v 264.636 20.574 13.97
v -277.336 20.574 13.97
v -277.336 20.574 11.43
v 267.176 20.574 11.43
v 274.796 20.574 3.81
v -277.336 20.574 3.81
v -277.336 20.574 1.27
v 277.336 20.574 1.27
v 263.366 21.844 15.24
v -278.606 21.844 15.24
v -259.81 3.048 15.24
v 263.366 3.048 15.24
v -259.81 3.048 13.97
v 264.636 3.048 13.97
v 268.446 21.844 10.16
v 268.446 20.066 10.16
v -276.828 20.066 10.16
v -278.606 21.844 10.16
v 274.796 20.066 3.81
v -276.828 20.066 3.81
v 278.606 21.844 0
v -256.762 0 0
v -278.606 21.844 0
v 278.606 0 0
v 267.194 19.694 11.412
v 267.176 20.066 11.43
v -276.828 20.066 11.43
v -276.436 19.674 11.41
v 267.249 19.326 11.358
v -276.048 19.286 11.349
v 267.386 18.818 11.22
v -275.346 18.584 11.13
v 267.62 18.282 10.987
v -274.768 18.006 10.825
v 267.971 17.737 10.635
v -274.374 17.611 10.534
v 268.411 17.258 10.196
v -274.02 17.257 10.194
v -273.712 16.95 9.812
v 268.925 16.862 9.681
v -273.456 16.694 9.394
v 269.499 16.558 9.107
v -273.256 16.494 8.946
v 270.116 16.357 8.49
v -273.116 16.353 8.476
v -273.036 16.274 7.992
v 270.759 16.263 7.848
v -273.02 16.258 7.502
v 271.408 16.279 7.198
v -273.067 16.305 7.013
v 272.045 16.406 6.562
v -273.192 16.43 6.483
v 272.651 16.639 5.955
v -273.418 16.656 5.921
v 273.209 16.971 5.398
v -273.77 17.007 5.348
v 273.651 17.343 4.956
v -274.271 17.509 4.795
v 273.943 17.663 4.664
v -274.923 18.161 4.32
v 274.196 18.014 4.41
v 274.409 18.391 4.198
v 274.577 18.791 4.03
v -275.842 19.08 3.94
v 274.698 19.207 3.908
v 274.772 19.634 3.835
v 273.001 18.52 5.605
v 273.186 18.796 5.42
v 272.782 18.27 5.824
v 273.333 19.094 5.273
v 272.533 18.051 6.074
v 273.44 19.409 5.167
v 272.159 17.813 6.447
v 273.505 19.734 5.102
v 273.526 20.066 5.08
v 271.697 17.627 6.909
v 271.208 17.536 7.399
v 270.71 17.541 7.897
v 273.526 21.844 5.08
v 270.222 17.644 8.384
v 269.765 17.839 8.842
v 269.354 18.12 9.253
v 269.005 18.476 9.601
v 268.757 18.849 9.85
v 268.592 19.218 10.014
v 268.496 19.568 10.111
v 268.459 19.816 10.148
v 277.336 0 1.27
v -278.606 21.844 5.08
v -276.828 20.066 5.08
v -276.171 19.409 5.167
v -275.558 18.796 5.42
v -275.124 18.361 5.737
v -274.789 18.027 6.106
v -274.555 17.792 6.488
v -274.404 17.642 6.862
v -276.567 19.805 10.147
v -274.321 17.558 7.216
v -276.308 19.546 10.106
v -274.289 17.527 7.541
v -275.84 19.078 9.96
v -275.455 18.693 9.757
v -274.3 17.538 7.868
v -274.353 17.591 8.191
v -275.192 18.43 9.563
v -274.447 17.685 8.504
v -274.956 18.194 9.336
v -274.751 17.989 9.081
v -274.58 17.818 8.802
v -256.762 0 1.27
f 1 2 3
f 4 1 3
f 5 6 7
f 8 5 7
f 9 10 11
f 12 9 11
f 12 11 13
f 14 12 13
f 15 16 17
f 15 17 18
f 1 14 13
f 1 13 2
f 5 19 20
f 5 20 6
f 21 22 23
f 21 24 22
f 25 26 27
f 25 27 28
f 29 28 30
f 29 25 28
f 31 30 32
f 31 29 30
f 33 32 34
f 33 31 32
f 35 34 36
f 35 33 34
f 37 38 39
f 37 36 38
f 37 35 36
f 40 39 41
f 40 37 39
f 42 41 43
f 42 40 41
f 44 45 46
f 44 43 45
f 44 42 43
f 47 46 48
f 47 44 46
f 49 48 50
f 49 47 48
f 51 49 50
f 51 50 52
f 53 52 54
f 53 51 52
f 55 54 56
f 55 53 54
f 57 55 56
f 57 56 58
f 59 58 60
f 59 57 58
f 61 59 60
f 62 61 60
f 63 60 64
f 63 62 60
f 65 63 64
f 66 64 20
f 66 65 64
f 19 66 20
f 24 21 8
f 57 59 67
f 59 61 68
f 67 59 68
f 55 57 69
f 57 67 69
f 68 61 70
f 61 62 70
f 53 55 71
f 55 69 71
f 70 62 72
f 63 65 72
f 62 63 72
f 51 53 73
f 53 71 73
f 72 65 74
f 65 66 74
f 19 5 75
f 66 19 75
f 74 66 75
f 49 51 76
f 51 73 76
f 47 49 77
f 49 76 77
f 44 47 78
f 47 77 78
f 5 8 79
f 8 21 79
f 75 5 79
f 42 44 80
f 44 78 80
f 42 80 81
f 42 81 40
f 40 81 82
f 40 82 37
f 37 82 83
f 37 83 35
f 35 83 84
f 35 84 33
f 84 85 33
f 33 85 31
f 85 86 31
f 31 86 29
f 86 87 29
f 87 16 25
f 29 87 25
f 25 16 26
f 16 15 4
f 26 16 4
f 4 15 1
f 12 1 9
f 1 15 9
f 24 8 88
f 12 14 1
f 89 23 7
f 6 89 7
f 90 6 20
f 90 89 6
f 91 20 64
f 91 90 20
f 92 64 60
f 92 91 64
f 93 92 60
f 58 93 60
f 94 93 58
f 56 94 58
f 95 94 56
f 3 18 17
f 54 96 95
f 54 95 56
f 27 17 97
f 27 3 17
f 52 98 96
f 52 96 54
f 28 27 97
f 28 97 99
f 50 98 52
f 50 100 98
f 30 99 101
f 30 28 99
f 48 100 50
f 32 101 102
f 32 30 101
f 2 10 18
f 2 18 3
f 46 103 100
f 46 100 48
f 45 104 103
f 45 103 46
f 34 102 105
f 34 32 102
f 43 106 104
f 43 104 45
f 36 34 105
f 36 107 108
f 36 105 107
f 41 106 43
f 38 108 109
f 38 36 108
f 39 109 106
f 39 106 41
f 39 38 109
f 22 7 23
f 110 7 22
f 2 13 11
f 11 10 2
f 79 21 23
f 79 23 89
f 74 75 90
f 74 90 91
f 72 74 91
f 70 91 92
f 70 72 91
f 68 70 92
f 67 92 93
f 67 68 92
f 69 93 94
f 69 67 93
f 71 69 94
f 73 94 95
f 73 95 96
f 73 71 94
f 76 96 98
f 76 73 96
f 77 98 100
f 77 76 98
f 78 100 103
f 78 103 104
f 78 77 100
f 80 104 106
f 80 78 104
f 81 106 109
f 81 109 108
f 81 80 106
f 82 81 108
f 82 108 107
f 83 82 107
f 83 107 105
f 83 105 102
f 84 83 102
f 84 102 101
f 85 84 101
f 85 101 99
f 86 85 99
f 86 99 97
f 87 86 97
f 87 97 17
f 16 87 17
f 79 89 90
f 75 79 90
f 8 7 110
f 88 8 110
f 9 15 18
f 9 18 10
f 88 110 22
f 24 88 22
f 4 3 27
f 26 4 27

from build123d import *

# Parameters (mm, degrees)
BOSS_EXTRUDE1_DEPTH         = 278.60625
CUT_FRONT_LEFT_BOTTOM_DEPTH = 16.24
CUT_TOP_RIGHT_FRONT_DEPTH   = 22.844


with BuildPart() as part:
    # Sketch1 → Boss-Extrude1 (new body, symmetric)
    with BuildSketch(Plane(origin=(0, 0, 0), x_dir=(0, 0, -1), z_dir=(1, 0, 0))):
        with BuildLine():
            Line((0, 0), (0, 21.844))
            Line((0, 21.844), (-5.08, 21.844))
            Line((-5.08, 21.844), (-5.08, 20.066))
            ThreePointArc((-5.08, 20.066), (-7.62, 17.526), (-10.16, 20.066))
            Line((-10.16, 20.066), (-10.16, 21.844))
            Line((-10.16, 21.844), (-15.24, 21.844))
            Line((-15.24, 21.844), (-15.24, 3.048))
            Line((-15.24, 3.048), (-13.97, 3.048))
            Line((-13.97, 3.048), (-13.97, 20.574))
            Line((-13.97, 20.574), (-11.43, 20.574))
            Line((-11.43, 20.574), (-11.43, 20.066))
            ThreePointArc((-11.43, 20.066), (-7.62, 16.256), (-3.81, 20.066))
            Line((-3.81, 20.066), (-3.81, 20.574))
            Line((-3.81, 20.574), (-1.27, 20.574))
            Line((-1.27, 20.574), (-1.27, 0))
            Line((-1.27, 0), (0, 0))
        make_face()
    extrude(amount=BOSS_EXTRUDE1_DEPTH, both=True)

    # Sketch7 → Cut-Front-Left-Bottom (cut, through all)
    with BuildSketch(Plane.XY.offset(15.24)):
        Polygon((-278.60625, 21.844), (-256.76225, 0), (-278.60625, 0), align=None)
    extrude(amount=-CUT_FRONT_LEFT_BOTTOM_DEPTH, mode=Mode.SUBTRACT)

    # Sketch2 → Cut-Top-Right-Front (cut, through all)
    with BuildSketch(Plane(origin=(0, 21.844, 0), x_dir=(1, 0, 0), z_dir=(0, 1, 0))):
        Polygon((278.60625, 0), (263.36625, -15.24), (278.60625, -15.24), align=None)
    extrude(amount=-CUT_TOP_RIGHT_FRONT_DEPTH, mode=Mode.SUBTRACT)


solid = part.part
